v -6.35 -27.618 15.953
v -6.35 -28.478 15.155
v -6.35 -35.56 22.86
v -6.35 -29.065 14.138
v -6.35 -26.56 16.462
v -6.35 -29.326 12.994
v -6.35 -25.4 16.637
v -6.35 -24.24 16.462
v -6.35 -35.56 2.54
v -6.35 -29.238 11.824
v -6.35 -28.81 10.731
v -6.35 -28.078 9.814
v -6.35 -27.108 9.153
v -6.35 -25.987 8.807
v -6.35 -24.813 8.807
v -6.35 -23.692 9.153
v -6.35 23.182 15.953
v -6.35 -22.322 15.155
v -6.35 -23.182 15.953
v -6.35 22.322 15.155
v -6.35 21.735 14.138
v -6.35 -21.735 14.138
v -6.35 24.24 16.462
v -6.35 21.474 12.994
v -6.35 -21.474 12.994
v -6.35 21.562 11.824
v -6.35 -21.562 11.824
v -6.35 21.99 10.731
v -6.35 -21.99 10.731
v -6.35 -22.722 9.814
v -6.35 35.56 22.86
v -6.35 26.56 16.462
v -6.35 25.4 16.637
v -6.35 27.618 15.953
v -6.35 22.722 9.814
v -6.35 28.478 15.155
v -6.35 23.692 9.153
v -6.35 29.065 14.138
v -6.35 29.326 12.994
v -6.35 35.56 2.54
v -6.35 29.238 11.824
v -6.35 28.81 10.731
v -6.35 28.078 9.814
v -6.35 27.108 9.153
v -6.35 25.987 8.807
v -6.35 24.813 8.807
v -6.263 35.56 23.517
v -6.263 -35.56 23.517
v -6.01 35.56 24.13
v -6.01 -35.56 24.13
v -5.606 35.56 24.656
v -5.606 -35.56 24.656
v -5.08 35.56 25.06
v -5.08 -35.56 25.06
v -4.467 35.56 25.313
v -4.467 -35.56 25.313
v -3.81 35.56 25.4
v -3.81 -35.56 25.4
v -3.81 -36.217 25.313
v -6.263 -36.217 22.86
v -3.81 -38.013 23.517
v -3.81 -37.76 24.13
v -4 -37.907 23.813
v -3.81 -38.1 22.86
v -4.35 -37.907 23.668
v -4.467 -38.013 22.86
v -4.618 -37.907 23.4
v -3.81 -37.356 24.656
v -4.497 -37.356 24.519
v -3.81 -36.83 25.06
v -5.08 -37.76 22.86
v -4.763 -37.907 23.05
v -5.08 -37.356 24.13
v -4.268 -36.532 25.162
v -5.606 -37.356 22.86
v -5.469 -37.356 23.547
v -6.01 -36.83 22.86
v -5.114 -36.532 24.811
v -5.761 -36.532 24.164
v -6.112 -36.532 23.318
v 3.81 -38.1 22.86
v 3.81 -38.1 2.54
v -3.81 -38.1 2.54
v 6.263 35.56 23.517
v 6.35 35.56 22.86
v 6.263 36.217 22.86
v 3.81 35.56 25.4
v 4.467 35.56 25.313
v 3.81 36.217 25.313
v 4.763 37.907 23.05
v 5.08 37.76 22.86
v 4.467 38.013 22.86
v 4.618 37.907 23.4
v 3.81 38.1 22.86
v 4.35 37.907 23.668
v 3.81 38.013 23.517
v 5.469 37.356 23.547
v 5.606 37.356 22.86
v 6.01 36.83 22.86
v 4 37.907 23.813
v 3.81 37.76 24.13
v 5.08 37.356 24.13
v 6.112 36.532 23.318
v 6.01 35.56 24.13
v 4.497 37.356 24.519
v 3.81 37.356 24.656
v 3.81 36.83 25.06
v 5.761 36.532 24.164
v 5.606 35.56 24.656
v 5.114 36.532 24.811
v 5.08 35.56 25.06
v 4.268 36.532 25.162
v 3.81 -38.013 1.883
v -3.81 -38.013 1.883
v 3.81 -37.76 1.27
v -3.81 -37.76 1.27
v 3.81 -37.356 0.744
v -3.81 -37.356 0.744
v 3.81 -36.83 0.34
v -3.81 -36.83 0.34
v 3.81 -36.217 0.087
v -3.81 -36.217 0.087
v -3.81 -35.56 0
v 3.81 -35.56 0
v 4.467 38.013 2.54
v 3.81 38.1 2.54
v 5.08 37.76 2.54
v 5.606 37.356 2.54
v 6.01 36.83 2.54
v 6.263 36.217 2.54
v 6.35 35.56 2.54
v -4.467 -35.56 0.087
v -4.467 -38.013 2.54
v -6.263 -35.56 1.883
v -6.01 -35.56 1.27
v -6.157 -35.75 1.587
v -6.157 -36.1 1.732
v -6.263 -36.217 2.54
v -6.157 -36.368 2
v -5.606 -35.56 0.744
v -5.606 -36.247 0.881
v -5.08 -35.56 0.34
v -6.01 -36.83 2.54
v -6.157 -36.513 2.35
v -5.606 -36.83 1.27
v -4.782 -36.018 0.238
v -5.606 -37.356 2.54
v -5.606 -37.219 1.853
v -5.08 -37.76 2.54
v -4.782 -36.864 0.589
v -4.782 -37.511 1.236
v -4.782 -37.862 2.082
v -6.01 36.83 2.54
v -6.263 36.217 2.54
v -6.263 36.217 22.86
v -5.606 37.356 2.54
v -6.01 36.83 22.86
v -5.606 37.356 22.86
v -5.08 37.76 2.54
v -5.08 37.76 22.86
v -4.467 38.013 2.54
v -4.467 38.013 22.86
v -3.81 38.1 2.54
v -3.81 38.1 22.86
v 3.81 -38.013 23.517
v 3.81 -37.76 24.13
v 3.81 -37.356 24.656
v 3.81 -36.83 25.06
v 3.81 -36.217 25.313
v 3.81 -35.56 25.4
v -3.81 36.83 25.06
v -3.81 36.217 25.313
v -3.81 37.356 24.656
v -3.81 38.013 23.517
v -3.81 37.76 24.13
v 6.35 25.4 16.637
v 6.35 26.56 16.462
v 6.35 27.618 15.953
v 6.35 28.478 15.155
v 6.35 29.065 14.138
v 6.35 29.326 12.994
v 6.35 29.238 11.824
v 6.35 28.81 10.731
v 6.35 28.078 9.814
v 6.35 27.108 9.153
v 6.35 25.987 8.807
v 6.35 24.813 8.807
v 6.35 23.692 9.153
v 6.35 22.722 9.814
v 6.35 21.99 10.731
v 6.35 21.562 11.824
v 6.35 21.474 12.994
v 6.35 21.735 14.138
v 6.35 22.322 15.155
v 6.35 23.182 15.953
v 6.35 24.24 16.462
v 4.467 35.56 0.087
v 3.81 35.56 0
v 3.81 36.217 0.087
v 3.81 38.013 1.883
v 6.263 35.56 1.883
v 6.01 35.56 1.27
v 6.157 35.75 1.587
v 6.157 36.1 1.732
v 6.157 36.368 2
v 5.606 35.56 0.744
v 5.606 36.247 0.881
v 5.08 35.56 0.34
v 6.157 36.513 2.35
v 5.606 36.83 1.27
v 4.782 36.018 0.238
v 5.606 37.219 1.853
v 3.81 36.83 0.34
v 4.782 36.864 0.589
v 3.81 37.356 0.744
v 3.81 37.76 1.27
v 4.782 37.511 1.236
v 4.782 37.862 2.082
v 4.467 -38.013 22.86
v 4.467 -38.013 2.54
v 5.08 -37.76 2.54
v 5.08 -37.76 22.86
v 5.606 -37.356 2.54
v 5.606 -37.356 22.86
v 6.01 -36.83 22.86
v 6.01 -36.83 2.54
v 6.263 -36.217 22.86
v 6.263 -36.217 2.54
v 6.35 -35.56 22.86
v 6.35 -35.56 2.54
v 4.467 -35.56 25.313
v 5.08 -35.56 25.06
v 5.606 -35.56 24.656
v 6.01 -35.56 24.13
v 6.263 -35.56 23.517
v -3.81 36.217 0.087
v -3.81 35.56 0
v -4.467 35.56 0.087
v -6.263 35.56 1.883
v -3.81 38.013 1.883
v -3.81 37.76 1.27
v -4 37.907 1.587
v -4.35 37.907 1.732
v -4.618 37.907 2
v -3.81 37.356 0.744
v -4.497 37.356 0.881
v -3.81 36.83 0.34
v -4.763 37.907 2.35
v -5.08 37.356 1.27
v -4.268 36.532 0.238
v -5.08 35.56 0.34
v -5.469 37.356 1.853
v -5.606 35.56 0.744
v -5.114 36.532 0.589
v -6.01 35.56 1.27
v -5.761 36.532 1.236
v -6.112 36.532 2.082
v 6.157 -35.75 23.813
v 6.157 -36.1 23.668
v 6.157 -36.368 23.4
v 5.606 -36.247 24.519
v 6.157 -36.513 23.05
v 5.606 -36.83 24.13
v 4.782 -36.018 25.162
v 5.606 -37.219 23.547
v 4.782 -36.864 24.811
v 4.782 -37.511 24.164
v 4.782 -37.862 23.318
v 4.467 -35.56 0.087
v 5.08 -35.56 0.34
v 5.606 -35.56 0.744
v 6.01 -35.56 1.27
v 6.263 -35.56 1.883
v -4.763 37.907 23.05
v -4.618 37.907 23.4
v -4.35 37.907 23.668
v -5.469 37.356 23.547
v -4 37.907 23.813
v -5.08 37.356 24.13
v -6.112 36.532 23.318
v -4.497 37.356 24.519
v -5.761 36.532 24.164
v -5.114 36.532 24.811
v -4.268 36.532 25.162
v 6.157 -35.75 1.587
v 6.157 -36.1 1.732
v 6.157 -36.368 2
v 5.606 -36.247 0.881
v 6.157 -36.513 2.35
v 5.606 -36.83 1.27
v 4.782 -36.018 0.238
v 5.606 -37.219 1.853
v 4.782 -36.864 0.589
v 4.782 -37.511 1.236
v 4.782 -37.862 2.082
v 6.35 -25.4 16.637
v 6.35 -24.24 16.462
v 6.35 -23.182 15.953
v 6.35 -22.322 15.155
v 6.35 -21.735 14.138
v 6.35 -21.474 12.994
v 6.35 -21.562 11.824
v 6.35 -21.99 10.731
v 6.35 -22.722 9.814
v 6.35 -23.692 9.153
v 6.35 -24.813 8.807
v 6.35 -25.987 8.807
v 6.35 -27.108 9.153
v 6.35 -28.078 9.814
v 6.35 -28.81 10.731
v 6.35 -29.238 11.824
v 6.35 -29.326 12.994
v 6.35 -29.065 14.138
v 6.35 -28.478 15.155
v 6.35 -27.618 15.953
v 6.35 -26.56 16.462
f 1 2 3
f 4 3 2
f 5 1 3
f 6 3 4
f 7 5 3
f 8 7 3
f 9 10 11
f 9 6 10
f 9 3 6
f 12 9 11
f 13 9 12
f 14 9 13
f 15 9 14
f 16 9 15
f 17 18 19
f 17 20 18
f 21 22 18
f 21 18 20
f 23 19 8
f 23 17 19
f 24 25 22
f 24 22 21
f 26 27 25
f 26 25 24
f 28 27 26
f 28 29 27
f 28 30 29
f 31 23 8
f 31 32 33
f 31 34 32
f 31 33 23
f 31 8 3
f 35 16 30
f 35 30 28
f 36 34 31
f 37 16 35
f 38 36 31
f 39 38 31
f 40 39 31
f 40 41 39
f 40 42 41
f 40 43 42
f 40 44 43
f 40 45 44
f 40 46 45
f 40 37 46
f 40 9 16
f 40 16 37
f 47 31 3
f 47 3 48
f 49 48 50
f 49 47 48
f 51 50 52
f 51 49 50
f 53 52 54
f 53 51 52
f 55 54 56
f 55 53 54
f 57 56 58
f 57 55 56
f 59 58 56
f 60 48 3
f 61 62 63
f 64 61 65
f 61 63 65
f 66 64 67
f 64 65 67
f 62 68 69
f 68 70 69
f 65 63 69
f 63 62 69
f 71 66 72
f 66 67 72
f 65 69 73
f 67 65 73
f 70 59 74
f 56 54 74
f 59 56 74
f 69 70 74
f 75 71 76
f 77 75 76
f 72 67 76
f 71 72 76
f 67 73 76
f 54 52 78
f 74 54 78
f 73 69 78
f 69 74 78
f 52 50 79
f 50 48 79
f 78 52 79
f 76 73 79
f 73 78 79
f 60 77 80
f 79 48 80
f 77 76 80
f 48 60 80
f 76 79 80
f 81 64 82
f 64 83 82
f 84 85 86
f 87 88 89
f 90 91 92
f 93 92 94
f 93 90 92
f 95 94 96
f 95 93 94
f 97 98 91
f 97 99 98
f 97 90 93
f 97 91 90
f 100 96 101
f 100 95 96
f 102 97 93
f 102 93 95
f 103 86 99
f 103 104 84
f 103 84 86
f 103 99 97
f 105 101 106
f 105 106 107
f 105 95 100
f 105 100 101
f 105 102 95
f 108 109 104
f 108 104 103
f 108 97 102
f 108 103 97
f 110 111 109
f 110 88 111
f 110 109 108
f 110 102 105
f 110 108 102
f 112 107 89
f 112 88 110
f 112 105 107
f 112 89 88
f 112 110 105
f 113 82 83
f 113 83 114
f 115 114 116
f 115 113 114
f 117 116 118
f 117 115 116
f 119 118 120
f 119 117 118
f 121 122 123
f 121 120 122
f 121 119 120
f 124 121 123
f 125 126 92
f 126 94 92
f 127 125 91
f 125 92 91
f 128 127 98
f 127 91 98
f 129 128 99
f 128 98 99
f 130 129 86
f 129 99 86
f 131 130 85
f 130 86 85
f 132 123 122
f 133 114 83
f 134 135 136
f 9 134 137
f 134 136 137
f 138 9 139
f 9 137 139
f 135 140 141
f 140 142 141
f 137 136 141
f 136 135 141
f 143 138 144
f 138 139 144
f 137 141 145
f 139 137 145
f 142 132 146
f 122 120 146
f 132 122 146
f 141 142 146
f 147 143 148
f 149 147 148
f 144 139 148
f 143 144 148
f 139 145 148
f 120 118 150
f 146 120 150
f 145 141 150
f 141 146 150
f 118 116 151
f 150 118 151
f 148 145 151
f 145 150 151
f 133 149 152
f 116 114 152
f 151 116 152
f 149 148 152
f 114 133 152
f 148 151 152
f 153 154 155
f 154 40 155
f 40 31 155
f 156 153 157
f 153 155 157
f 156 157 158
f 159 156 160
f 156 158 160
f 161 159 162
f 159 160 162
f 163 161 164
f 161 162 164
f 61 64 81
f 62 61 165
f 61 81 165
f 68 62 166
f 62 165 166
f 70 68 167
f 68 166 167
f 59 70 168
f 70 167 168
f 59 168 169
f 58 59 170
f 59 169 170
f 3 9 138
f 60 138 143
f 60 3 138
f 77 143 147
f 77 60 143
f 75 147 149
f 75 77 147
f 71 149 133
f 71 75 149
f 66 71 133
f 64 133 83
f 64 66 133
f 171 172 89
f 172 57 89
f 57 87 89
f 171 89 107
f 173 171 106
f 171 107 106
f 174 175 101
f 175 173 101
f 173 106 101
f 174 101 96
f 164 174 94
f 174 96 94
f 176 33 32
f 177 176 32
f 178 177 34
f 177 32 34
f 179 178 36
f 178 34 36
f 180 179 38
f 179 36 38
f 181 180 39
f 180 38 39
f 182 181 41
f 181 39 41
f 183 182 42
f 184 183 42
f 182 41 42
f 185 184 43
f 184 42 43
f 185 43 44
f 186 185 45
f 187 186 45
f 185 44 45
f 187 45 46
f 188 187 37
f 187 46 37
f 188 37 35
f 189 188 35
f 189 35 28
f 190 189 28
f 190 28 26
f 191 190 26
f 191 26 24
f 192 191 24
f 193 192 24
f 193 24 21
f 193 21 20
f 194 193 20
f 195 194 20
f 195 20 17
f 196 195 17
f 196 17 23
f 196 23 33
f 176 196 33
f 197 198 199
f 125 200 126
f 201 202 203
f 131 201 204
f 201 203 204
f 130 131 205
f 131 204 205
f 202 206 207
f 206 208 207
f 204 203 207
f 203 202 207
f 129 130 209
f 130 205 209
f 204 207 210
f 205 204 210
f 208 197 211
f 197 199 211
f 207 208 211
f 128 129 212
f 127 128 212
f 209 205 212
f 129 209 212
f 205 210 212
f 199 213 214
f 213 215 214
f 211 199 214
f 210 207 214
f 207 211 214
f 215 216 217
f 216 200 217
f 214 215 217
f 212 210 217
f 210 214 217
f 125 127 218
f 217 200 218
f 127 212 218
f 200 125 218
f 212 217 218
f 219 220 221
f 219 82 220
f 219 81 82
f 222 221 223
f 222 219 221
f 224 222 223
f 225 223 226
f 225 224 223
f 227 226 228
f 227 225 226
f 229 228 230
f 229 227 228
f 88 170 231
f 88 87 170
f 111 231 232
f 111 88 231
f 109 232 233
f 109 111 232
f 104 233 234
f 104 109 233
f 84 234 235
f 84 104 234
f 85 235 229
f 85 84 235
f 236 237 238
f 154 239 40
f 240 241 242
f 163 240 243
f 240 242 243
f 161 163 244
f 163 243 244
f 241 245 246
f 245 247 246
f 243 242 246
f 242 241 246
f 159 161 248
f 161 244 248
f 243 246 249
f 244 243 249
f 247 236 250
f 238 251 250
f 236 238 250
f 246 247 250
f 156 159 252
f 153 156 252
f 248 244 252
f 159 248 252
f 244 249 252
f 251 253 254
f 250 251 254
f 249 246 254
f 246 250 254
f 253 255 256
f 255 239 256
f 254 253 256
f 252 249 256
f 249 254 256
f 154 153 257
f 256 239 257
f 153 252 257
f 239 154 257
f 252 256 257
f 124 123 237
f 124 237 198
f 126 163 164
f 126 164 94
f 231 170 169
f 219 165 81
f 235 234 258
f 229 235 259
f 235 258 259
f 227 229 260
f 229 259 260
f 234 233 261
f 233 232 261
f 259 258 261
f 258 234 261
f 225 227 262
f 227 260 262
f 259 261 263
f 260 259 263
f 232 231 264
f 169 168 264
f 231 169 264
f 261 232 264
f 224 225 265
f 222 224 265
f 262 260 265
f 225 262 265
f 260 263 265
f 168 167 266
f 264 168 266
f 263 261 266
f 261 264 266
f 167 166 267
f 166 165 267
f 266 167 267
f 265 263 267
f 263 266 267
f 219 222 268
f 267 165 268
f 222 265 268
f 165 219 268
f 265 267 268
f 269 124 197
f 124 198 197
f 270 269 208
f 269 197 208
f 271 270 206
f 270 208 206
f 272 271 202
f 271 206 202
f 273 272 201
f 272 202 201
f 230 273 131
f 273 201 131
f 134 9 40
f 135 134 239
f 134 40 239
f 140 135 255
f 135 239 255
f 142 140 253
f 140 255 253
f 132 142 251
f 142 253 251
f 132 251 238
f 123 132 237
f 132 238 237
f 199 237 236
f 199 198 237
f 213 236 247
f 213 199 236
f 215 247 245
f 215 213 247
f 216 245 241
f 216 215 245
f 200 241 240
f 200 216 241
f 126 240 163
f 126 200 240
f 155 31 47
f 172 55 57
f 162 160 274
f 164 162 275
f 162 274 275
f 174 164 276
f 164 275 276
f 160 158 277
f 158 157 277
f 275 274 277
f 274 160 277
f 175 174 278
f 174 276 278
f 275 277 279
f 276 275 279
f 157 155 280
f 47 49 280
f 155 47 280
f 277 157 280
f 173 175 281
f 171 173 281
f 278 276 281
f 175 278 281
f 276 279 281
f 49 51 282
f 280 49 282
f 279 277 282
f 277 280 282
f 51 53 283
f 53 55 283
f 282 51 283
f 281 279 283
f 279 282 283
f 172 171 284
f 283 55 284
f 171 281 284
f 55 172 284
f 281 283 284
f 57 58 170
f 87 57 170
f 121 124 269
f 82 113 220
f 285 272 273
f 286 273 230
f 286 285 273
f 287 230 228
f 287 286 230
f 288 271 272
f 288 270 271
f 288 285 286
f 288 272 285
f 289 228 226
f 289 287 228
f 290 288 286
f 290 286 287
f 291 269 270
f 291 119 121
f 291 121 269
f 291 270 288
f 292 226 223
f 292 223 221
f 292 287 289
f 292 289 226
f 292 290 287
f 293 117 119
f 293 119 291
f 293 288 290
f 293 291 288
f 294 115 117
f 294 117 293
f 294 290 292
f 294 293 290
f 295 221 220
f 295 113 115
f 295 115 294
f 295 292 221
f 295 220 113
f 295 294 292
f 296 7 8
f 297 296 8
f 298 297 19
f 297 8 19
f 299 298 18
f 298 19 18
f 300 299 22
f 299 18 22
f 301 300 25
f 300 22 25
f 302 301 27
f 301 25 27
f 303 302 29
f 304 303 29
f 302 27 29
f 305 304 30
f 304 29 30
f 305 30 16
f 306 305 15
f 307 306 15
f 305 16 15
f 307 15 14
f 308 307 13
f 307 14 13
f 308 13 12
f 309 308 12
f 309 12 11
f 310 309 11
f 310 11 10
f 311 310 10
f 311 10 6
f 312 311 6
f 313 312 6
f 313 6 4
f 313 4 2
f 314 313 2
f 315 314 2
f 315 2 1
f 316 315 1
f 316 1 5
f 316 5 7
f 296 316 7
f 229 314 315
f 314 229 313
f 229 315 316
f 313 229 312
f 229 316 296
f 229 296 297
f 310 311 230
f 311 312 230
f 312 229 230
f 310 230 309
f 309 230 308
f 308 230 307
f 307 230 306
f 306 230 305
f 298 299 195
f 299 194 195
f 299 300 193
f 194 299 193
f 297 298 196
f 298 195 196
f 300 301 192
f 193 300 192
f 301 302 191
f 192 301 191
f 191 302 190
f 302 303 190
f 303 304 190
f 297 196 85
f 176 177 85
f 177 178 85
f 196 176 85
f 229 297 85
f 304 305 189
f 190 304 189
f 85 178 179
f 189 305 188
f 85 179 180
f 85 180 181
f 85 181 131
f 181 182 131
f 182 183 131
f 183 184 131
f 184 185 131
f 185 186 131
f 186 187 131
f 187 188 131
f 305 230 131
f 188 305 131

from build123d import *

# Parameters (mm, degrees)
SKETCH1_W                  = 12.7
SKETCH1_H                  = 76.2
BOSS_EXTRUDE1_DEPTH        = 25.4
F_97_0_31_DIAMETER_HOLE1_D = 7.874
FILLET1_R                  = 2.54


with BuildPart() as part:
    # Sketch1 → Boss-Extrude1 (new body)
    with BuildSketch(Plane.XY):
        Rectangle(SKETCH1_W, SKETCH1_H)
    extrude(amount=BOSS_EXTRUDE1_DEPTH)

    # #97 (0.31) Diameter Hole1 (through all)
    with Locations(Plane(origin=(6.35, 0, 0), x_dir=(0, 0, -1), z_dir=(1, 0, 0))):
        with Locations((-12.7, 25.4), (-12.7, -25.4)):
            Hole(F_97_0_31_DIAMETER_HOLE1_D / 2)

    # Fillet1
    fillet1_edges = [part.edges().sort_by_distance(p)[0] for p in [
        (-6.35, 0, 25.4),
        (0, -38.1, 25.4),
        (6.35, 0, 25.4),
        (0, -38.1, 0),
        (-6.35, 0, 0),
        (0, 38.1, 0),
        (6.35, 0, 0),
        (6.35, -38.1, 12.7),
        (-6.35, -38.1, 12.7),
        (-6.35, 38.1, 12.7),
        (6.35, 38.1, 12.7),
        (0, 38.1, 25.4),
    ]]
    fillet(fillet1_edges, radius=FILLET1_R)


solid = part.part
